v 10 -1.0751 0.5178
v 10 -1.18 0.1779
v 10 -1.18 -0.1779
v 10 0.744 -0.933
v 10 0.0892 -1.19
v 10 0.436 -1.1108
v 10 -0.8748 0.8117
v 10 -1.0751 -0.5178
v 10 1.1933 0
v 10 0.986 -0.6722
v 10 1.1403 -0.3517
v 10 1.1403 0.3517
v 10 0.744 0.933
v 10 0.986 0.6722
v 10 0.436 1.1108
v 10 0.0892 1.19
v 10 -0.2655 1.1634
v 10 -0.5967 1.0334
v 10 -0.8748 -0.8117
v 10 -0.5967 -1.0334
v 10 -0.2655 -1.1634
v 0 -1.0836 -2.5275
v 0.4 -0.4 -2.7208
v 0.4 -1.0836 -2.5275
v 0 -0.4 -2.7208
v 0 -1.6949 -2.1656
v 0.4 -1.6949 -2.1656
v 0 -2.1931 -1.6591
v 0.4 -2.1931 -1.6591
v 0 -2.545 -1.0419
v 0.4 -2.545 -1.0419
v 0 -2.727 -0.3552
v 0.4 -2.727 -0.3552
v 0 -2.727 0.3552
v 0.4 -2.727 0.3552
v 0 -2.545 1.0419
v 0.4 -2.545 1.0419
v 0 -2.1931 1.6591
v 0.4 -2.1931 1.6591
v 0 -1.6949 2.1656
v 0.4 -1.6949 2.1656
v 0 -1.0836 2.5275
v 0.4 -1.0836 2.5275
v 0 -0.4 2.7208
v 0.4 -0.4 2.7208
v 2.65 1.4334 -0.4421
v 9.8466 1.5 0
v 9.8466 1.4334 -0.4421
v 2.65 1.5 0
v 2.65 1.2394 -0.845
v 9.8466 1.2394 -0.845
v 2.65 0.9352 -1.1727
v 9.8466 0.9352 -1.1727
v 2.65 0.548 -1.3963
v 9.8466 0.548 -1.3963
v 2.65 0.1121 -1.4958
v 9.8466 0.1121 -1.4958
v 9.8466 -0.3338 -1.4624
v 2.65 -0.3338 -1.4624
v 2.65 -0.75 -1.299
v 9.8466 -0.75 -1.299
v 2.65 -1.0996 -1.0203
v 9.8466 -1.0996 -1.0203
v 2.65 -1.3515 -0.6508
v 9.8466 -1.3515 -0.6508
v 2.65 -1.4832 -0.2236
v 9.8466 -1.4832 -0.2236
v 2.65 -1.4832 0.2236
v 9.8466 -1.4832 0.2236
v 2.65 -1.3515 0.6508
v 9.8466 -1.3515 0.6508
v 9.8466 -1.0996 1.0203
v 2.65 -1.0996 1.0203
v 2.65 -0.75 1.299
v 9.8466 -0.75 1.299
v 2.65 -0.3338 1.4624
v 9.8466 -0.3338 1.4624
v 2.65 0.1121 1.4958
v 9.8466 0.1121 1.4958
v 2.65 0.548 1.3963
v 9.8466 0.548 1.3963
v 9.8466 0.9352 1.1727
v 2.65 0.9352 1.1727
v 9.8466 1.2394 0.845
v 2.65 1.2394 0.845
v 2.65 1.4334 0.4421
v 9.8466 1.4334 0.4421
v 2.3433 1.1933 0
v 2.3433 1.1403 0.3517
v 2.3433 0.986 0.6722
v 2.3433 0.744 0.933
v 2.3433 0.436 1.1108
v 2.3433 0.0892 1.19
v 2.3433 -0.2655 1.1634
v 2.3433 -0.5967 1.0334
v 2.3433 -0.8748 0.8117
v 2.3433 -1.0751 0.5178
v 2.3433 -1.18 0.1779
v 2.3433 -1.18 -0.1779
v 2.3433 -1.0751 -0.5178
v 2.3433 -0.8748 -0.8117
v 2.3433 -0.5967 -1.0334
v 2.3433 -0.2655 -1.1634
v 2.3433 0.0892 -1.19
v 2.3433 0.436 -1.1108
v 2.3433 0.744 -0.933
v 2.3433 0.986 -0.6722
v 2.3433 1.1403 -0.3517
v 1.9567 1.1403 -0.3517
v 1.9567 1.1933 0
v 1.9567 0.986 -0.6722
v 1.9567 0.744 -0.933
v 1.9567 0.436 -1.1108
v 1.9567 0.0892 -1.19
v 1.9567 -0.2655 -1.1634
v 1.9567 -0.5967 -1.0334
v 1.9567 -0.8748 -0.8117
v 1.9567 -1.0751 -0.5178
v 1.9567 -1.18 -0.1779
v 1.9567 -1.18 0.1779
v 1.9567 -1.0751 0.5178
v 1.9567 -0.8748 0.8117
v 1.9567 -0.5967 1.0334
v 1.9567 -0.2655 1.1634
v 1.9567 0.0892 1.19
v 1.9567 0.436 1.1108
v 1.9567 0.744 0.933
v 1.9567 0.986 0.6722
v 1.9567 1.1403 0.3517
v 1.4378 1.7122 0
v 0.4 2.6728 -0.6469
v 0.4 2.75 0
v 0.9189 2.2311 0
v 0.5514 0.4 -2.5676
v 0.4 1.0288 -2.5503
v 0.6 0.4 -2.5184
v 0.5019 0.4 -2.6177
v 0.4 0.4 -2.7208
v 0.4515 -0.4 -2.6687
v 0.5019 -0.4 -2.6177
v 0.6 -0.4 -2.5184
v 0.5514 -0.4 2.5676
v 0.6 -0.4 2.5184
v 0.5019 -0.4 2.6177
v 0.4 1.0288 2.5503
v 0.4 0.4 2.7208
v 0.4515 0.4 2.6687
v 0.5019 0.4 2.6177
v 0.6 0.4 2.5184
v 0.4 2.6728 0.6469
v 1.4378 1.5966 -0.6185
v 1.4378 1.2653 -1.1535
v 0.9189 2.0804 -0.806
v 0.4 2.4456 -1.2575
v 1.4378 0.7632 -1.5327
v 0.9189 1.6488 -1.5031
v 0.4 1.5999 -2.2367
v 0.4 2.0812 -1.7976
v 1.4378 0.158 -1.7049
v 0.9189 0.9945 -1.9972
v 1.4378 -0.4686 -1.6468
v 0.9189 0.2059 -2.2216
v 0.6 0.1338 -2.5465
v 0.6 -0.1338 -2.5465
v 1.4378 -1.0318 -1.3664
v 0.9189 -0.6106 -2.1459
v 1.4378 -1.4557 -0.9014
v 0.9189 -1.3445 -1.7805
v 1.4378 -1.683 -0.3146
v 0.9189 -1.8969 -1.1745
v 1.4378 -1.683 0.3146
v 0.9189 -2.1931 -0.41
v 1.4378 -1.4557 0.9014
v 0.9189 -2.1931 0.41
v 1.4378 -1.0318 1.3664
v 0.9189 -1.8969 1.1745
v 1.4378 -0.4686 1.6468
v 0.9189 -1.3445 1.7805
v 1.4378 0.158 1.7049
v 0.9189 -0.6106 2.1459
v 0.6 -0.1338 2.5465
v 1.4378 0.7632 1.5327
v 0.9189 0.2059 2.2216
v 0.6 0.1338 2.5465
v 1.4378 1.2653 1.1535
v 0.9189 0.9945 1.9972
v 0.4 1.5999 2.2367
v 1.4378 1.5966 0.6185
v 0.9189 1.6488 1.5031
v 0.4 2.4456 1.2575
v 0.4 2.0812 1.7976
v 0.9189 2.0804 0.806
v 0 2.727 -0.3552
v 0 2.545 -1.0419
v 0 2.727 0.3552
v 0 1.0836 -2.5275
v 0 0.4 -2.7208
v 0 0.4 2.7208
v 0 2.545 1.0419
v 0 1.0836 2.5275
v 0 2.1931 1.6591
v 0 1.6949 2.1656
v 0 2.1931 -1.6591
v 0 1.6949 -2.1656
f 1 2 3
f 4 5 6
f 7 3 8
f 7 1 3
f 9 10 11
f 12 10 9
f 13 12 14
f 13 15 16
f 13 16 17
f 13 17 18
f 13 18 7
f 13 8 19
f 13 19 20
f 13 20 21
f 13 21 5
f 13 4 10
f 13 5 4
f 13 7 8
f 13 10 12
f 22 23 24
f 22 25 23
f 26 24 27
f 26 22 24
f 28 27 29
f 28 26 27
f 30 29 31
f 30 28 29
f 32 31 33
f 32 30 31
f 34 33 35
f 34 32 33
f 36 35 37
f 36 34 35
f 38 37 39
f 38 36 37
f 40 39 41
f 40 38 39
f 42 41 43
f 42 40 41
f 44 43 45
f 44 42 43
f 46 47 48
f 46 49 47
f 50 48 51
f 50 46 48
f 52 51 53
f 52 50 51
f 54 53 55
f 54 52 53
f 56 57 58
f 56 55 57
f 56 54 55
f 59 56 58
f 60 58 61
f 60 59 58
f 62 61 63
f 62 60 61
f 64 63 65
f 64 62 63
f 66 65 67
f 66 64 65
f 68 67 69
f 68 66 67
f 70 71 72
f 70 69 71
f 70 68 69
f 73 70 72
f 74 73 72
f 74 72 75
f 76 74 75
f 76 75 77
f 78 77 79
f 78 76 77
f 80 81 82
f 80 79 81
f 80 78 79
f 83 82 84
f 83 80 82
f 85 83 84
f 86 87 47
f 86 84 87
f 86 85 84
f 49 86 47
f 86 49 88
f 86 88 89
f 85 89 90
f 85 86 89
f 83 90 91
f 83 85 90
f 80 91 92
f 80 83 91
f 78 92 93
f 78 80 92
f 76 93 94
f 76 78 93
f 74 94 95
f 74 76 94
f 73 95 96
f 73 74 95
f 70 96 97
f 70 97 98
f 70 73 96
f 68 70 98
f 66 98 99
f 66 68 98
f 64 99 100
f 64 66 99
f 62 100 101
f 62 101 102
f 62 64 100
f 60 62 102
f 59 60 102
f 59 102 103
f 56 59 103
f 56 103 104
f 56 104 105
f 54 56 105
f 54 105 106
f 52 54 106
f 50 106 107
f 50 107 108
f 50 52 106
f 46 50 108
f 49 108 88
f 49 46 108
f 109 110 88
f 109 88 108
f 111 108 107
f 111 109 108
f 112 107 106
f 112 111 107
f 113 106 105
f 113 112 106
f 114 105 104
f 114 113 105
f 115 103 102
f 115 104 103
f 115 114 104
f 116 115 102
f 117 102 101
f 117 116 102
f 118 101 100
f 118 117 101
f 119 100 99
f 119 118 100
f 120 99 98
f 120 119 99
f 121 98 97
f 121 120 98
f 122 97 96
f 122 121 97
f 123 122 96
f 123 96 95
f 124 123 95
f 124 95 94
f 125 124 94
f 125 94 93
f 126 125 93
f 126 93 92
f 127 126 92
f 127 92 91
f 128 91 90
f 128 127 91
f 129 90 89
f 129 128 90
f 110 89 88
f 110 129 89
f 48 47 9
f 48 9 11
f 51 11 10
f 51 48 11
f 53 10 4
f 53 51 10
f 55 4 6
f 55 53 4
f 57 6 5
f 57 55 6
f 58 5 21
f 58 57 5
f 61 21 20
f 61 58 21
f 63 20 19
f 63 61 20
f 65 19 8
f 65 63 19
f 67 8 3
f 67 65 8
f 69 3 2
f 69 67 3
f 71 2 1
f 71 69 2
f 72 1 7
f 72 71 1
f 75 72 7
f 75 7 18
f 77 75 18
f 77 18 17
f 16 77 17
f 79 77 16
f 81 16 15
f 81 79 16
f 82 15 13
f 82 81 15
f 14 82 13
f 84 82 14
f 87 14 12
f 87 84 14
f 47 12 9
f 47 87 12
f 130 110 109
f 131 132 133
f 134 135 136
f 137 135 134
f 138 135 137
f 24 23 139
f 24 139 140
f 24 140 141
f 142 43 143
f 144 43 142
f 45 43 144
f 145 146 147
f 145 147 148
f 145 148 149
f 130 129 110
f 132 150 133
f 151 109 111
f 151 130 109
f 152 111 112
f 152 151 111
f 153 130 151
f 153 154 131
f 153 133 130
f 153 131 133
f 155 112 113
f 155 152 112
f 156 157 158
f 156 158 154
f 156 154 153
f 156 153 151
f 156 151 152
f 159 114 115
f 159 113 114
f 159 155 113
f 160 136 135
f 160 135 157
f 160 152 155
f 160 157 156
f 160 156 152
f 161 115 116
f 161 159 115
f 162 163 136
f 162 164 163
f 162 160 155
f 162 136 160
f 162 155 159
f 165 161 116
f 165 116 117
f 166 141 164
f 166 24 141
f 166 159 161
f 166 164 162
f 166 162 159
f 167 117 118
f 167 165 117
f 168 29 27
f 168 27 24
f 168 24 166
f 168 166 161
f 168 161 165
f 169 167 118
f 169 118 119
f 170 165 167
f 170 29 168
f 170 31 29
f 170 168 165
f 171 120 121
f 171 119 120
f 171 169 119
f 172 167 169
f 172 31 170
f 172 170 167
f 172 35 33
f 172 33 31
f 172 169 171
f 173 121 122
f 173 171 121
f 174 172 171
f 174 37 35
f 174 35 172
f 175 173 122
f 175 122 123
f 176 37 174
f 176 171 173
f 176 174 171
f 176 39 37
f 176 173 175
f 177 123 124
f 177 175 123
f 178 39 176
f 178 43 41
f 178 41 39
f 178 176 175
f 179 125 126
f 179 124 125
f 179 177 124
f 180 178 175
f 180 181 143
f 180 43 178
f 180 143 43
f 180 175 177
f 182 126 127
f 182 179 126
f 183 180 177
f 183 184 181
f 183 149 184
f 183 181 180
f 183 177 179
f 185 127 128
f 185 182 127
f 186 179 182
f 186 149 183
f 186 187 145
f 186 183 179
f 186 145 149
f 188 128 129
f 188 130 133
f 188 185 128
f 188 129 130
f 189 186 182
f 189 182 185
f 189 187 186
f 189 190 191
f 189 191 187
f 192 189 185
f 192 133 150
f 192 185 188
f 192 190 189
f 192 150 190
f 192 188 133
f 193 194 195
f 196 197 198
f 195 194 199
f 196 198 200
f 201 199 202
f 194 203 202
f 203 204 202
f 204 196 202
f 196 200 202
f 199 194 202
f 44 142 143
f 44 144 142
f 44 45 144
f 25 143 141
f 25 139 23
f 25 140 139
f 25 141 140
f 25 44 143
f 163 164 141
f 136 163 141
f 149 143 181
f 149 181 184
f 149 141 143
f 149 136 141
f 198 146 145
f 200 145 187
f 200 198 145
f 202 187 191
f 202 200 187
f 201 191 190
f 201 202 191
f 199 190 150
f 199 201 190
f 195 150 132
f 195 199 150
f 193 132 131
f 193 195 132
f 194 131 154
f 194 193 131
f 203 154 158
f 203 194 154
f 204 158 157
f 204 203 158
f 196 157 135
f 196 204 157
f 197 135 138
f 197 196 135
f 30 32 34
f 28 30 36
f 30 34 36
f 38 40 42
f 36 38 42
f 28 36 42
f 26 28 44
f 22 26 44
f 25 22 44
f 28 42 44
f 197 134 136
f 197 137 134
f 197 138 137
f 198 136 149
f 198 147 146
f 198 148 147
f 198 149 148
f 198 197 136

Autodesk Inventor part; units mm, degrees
ref_plane "YZ Plane" through (0, 0, 0) normal (1, 0, 0) x (0, 1, 0)
ref_plane "XZ Plane" through (0, 0, 0) normal (0, 1, 0) x (-1, 0, 0)
sketch "스케치1" plane through (0, 0, 0) normal (0, 0, 1) x (1, 0, 0)
  line L0 (0, 0) -> (10, 0)
  line L1 (10, 0) -> (10, 1.5)
  line L2 (10, 1.5) -> (2.65, 1.5)
  line L3 (2.65, 1.5) -> (2.3433, 1.1933)
  line L4 (2.3433, 1.1933) -> (1.9567, 1.1933)
  line L5 (1.9567, 1.1933) -> (0.4, 2.75)
  line L6 (0.4, 2.75) -> (0, 2.75)
  line L7 (0, 2.75) -> (0, 0)
  line L8 (2.65, 1.5) -> (1.65, 1.5) construction
  line L9 (-2, 0) -> (12, 0) projected
  line L10 (0, 3.3) -> (0, -0.55) projected
  dimension "d0" = 10
  dimension "d1" = 45
  dimension "d2" = 0.3067
  dimension "d4" = 1.65
  dimension "d5" = 2.3866
  dimension "d6" = 3
  dimension "d7" = 5.5
revolve "본체" add sketch "스케치1" angle 360 about axis through (0, 0, 0) along (1, 0, 0)
sketch "스케치2" plane through (0, 0, 0) normal (-1, 0, 0) x (0, 0, 1)
  line L0 (2.75, -0.4) -> (-2.75, -0.4)
  line L1 (-2.75, -0.4) -> (-2.75, 0.4)
  line L2 (-2.75, 0.4) -> (2.75, 0.4)
  line L3 (2.75, 0.4) -> (2.75, -0.4)
  line L4 (0, 0.4) -> (0, -0.4) construction
  line L5 (-2.75, 0) -> (2.75, 0) construction
  line L6 (0, 2.75) -> (0, 0) projected
  dimension "d15" = 0.8
  dimension "d16" = 5.5
extrude "슬롯" cut sketch "스케치2" against normal blind 0.6
thread "스레드" size "M3x0.5" class "6g" standard "ISO Metric profile" length 8
chamfer "모따기1" distance 0.3067 distance2 0.1534 1 edges at (10, -1.5, 0) measured on face at (10, -0.5495, 0.6466)
ref_plane "Work Plane1" through (33.575, 0, 0) normal (0, 0, -1) x (1, 0, 0)
equation "\"d15\" = SBR"
equation "\"d16\" = KOD"
equation "\"d8\" = STI"
equation "\"d12\" = -0.5 * SPD + 0.5 * GD"
equation "\"d13\" = 0.5 * GAL"
equation "\"d1\" = 0.5 * SEWI"
equation "\"d2\" = GAL"
equation "\"d4\" = KOH"
equation "\"d5\" = BDM"
equation "\"d6\" = GD"
equation "\"d7\" = KOD"
equation "\"NLG\" = 6"
equation "\"GAL\" = 0.61345 * PTC"
equation "\"GEL\" = 3.35"
equation "\"KOH\" = 1.65"
equation "\"KOD\" = 5.5"
equation "\"SEWI\" = 90deg"
equation "\"BDM\" = NND - 1.2269 * PTC"
equation "\"GD\" = NND"
equation "\"SBR\" = 0.8"
equation "\"STI\" = 0.6"
equation "\"SPD\" = NND - 1.2269 * PTC"
equation "\"GUL\" = 0.61345 * PTC"
equation "\"PTC\" = 0.5"
equation "\"EPV\" = 3.15"
equation "\"THREADDIA\" = 3"
equation "\"TOA\" = 30deg"
equation "\"NND\" = 3"
equation "\"GD1\" = THREADDIA - 1.2269 * PTC"
properties part number "KS B 1021 - M 3 x 6(1)" material "강철, 연강"
